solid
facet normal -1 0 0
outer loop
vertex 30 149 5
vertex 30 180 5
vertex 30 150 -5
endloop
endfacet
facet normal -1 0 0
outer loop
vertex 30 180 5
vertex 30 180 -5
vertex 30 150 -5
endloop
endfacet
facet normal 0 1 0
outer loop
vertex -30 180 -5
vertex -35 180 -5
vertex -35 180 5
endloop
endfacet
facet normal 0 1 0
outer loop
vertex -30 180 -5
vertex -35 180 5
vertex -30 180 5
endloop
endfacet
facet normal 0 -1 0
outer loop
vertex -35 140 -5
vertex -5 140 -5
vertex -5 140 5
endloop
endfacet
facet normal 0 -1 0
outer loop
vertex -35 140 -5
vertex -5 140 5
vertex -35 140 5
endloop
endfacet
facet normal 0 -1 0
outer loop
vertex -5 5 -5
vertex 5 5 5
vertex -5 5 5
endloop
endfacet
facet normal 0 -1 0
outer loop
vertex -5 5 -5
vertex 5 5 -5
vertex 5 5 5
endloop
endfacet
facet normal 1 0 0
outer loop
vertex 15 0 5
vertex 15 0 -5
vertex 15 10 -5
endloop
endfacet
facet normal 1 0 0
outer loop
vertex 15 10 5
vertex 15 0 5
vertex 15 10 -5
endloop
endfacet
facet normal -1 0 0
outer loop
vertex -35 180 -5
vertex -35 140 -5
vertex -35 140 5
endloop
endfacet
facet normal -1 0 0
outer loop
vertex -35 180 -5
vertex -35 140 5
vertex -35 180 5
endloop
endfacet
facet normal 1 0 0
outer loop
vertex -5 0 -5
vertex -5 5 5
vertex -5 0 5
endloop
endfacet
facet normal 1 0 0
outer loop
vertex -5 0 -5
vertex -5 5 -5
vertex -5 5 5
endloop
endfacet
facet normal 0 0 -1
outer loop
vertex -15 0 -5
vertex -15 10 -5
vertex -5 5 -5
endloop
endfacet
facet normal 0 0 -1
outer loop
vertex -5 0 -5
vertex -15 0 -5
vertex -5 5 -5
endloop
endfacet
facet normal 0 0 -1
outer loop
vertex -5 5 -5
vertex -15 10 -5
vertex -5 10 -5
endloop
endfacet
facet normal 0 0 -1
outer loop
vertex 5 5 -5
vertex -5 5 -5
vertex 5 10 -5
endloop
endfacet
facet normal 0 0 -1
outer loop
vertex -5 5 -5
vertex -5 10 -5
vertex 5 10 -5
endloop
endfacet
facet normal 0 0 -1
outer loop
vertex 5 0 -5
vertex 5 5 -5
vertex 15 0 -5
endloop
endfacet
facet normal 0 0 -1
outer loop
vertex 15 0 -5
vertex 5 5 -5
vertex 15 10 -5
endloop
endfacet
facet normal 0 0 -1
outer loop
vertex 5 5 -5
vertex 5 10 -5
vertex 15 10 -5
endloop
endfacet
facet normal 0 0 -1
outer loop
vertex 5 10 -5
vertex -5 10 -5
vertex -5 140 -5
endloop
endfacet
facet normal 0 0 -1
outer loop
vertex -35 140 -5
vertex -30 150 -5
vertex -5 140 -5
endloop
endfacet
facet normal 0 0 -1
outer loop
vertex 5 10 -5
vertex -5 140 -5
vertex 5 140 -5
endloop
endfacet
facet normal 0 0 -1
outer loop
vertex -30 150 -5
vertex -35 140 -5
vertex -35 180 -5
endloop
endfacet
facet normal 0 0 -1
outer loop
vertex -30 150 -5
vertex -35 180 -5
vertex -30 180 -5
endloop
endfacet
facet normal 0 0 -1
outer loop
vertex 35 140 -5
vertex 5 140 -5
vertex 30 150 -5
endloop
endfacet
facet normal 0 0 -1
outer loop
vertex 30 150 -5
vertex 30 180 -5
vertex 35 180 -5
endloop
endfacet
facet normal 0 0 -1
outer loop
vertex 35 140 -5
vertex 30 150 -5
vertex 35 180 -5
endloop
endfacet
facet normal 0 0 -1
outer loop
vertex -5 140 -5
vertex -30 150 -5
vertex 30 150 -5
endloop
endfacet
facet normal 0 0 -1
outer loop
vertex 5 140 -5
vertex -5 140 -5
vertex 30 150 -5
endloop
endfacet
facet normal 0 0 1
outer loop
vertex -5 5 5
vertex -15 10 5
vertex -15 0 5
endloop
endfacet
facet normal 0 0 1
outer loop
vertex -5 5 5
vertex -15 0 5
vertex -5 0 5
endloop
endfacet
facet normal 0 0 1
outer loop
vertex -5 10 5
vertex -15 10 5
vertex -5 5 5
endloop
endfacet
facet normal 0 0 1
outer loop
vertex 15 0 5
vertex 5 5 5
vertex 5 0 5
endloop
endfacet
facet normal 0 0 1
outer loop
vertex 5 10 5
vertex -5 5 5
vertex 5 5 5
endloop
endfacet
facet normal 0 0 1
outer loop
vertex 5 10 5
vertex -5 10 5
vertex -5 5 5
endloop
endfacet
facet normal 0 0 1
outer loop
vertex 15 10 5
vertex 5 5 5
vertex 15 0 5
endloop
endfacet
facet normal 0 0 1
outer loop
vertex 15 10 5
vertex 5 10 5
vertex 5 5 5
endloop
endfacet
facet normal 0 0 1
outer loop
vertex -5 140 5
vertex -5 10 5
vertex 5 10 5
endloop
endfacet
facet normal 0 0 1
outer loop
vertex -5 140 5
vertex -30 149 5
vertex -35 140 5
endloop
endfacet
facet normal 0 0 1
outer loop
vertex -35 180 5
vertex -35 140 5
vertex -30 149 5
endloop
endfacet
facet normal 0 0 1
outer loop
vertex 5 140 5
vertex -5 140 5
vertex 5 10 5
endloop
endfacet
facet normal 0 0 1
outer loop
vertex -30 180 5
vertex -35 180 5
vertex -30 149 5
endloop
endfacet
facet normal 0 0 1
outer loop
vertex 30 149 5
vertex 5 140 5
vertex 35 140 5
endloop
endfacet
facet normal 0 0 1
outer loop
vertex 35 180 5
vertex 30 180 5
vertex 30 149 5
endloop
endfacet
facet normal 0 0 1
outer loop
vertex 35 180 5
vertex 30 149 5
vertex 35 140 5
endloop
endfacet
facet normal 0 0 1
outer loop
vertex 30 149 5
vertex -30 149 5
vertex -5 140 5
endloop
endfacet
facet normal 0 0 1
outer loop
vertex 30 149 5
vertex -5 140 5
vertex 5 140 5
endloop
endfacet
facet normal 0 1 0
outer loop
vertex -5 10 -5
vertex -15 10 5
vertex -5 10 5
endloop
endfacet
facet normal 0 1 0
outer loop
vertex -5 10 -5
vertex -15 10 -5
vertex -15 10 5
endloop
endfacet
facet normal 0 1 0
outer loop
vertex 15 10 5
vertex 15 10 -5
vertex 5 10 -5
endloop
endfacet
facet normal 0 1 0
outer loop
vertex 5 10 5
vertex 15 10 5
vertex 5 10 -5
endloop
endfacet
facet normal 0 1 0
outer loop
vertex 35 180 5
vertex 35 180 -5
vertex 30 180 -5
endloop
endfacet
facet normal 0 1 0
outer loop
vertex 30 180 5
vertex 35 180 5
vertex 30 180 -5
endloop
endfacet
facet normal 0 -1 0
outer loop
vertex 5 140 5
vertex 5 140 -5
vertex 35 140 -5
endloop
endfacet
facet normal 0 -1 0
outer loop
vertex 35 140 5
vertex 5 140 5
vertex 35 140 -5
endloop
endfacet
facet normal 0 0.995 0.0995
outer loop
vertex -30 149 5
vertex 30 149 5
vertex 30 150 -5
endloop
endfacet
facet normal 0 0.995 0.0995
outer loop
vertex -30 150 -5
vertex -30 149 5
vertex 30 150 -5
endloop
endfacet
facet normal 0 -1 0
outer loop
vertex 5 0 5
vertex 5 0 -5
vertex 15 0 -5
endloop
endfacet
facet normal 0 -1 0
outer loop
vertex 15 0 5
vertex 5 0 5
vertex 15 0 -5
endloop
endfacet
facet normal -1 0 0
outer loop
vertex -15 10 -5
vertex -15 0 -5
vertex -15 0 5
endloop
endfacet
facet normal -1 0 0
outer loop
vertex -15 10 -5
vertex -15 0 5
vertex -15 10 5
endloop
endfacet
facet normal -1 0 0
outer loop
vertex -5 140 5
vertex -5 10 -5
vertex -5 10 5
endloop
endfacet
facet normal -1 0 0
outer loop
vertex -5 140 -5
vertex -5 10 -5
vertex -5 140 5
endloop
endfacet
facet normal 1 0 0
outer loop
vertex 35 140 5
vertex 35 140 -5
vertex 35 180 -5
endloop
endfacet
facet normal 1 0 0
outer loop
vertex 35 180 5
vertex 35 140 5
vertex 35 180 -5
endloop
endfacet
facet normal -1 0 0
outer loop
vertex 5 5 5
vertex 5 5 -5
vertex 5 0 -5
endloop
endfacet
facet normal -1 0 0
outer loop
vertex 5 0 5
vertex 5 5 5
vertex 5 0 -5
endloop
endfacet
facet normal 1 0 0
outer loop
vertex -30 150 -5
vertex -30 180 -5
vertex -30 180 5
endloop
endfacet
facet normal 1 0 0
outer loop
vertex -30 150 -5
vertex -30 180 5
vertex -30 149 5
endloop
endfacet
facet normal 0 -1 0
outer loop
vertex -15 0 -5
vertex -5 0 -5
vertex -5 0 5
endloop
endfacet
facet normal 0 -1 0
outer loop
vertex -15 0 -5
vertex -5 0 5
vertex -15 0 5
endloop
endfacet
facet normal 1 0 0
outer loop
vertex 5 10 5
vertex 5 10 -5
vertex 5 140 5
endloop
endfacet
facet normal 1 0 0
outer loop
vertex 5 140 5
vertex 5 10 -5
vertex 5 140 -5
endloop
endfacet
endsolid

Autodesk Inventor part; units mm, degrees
ref_plane "YZ Plane" through (0, 0, 0) normal (1, 0, 0) x (0, 1, 0)
ref_plane "XZ Plane" through (0, 0, 0) normal (0, 1, 0) x (-1, 0, 0)
sketch "Sketch2" plane through (0, 0, 0) normal (0, 0, 1) x (1, 0, 0)
  line L0 (0, 0) -> (0, 50) construction
  line L1 (0, 0) -> (0, 5)
  line L2 (0, 5) -> (-5, 5)
  line L3 (-5, 5) -> (-5, 0)
  line L4 (-5, 0) -> (-15, 0)
  line L5 (-15, 0) -> (-15, 5)
  line L6 (-15, 5) -> (-15, 10)
  line L7 (-15, 10) -> (-5, 10)
  line L8 (-5, 10) -> (-5, 140)
  line L9 (-5, 140) -> (-35, 140)
  line L10 (-35, 140) -> (-35, 180)
  line L11 (-35, 180) -> (-30, 180)
  line L12 (-30, 180) -> (-30, 150)
  line L13 (-30, 150) -> (0, 150)
  line L14 (0, 5) -> (5, 5)
  line L15 (5, 5) -> (5, 0)
  line L16 (15, 0) -> (15, 5)
  line L17 (15, 5) -> (15, 10)
  line L18 (15, 10) -> (5, 10)
  line L19 (5, 10) -> (5, 140)
  line L20 (5, 140) -> (35, 140)
  line L21 (35, 140) -> (35, 180)
  line L22 (35, 180) -> (30, 180)
  line L23 (30, 180) -> (30, 150)
  line L24 (30, 150) -> (0, 150)
  line L25 (5, 0) -> (15, 0)
  dimension "d6" = 50
  dimension "d7" = 5
  dimension "d8" = 5
  dimension "d9" = 10
  dimension "d10" = 130
  dimension "d11" = 30
  dimension "d12" = 40
  dimension "d13" = 5
  dimension "d14" = 30
  dimension "d21" = 5
  dimension "d22" = 5
  dimension "d24" = 0
extrude "Extrusion1" add sketch "Sketch2" along normal mid plane 10
ref_plane "Work Plane1" through (0, 150, 5) normal (1, 0, 0) x (0, 0, -1)
sketch "Sketch3" plane through (0, 150, 5) normal (1, 0, 0) x (0, 0, -1)
  line L0 (0, 0) -> (10, 0)
  line L1 (0, 0) -> (0, -1)
  line L2 (10, -10) -> (0, -10) projected
  line L3 (0, -1) -> (10, 0)
  point P0 (5, -150)
  dimension "d27" = 1
extrude "Extrusion2" cut sketch "Sketch3" along normal mid plane 60
properties part number "Sorting Holder x1"
